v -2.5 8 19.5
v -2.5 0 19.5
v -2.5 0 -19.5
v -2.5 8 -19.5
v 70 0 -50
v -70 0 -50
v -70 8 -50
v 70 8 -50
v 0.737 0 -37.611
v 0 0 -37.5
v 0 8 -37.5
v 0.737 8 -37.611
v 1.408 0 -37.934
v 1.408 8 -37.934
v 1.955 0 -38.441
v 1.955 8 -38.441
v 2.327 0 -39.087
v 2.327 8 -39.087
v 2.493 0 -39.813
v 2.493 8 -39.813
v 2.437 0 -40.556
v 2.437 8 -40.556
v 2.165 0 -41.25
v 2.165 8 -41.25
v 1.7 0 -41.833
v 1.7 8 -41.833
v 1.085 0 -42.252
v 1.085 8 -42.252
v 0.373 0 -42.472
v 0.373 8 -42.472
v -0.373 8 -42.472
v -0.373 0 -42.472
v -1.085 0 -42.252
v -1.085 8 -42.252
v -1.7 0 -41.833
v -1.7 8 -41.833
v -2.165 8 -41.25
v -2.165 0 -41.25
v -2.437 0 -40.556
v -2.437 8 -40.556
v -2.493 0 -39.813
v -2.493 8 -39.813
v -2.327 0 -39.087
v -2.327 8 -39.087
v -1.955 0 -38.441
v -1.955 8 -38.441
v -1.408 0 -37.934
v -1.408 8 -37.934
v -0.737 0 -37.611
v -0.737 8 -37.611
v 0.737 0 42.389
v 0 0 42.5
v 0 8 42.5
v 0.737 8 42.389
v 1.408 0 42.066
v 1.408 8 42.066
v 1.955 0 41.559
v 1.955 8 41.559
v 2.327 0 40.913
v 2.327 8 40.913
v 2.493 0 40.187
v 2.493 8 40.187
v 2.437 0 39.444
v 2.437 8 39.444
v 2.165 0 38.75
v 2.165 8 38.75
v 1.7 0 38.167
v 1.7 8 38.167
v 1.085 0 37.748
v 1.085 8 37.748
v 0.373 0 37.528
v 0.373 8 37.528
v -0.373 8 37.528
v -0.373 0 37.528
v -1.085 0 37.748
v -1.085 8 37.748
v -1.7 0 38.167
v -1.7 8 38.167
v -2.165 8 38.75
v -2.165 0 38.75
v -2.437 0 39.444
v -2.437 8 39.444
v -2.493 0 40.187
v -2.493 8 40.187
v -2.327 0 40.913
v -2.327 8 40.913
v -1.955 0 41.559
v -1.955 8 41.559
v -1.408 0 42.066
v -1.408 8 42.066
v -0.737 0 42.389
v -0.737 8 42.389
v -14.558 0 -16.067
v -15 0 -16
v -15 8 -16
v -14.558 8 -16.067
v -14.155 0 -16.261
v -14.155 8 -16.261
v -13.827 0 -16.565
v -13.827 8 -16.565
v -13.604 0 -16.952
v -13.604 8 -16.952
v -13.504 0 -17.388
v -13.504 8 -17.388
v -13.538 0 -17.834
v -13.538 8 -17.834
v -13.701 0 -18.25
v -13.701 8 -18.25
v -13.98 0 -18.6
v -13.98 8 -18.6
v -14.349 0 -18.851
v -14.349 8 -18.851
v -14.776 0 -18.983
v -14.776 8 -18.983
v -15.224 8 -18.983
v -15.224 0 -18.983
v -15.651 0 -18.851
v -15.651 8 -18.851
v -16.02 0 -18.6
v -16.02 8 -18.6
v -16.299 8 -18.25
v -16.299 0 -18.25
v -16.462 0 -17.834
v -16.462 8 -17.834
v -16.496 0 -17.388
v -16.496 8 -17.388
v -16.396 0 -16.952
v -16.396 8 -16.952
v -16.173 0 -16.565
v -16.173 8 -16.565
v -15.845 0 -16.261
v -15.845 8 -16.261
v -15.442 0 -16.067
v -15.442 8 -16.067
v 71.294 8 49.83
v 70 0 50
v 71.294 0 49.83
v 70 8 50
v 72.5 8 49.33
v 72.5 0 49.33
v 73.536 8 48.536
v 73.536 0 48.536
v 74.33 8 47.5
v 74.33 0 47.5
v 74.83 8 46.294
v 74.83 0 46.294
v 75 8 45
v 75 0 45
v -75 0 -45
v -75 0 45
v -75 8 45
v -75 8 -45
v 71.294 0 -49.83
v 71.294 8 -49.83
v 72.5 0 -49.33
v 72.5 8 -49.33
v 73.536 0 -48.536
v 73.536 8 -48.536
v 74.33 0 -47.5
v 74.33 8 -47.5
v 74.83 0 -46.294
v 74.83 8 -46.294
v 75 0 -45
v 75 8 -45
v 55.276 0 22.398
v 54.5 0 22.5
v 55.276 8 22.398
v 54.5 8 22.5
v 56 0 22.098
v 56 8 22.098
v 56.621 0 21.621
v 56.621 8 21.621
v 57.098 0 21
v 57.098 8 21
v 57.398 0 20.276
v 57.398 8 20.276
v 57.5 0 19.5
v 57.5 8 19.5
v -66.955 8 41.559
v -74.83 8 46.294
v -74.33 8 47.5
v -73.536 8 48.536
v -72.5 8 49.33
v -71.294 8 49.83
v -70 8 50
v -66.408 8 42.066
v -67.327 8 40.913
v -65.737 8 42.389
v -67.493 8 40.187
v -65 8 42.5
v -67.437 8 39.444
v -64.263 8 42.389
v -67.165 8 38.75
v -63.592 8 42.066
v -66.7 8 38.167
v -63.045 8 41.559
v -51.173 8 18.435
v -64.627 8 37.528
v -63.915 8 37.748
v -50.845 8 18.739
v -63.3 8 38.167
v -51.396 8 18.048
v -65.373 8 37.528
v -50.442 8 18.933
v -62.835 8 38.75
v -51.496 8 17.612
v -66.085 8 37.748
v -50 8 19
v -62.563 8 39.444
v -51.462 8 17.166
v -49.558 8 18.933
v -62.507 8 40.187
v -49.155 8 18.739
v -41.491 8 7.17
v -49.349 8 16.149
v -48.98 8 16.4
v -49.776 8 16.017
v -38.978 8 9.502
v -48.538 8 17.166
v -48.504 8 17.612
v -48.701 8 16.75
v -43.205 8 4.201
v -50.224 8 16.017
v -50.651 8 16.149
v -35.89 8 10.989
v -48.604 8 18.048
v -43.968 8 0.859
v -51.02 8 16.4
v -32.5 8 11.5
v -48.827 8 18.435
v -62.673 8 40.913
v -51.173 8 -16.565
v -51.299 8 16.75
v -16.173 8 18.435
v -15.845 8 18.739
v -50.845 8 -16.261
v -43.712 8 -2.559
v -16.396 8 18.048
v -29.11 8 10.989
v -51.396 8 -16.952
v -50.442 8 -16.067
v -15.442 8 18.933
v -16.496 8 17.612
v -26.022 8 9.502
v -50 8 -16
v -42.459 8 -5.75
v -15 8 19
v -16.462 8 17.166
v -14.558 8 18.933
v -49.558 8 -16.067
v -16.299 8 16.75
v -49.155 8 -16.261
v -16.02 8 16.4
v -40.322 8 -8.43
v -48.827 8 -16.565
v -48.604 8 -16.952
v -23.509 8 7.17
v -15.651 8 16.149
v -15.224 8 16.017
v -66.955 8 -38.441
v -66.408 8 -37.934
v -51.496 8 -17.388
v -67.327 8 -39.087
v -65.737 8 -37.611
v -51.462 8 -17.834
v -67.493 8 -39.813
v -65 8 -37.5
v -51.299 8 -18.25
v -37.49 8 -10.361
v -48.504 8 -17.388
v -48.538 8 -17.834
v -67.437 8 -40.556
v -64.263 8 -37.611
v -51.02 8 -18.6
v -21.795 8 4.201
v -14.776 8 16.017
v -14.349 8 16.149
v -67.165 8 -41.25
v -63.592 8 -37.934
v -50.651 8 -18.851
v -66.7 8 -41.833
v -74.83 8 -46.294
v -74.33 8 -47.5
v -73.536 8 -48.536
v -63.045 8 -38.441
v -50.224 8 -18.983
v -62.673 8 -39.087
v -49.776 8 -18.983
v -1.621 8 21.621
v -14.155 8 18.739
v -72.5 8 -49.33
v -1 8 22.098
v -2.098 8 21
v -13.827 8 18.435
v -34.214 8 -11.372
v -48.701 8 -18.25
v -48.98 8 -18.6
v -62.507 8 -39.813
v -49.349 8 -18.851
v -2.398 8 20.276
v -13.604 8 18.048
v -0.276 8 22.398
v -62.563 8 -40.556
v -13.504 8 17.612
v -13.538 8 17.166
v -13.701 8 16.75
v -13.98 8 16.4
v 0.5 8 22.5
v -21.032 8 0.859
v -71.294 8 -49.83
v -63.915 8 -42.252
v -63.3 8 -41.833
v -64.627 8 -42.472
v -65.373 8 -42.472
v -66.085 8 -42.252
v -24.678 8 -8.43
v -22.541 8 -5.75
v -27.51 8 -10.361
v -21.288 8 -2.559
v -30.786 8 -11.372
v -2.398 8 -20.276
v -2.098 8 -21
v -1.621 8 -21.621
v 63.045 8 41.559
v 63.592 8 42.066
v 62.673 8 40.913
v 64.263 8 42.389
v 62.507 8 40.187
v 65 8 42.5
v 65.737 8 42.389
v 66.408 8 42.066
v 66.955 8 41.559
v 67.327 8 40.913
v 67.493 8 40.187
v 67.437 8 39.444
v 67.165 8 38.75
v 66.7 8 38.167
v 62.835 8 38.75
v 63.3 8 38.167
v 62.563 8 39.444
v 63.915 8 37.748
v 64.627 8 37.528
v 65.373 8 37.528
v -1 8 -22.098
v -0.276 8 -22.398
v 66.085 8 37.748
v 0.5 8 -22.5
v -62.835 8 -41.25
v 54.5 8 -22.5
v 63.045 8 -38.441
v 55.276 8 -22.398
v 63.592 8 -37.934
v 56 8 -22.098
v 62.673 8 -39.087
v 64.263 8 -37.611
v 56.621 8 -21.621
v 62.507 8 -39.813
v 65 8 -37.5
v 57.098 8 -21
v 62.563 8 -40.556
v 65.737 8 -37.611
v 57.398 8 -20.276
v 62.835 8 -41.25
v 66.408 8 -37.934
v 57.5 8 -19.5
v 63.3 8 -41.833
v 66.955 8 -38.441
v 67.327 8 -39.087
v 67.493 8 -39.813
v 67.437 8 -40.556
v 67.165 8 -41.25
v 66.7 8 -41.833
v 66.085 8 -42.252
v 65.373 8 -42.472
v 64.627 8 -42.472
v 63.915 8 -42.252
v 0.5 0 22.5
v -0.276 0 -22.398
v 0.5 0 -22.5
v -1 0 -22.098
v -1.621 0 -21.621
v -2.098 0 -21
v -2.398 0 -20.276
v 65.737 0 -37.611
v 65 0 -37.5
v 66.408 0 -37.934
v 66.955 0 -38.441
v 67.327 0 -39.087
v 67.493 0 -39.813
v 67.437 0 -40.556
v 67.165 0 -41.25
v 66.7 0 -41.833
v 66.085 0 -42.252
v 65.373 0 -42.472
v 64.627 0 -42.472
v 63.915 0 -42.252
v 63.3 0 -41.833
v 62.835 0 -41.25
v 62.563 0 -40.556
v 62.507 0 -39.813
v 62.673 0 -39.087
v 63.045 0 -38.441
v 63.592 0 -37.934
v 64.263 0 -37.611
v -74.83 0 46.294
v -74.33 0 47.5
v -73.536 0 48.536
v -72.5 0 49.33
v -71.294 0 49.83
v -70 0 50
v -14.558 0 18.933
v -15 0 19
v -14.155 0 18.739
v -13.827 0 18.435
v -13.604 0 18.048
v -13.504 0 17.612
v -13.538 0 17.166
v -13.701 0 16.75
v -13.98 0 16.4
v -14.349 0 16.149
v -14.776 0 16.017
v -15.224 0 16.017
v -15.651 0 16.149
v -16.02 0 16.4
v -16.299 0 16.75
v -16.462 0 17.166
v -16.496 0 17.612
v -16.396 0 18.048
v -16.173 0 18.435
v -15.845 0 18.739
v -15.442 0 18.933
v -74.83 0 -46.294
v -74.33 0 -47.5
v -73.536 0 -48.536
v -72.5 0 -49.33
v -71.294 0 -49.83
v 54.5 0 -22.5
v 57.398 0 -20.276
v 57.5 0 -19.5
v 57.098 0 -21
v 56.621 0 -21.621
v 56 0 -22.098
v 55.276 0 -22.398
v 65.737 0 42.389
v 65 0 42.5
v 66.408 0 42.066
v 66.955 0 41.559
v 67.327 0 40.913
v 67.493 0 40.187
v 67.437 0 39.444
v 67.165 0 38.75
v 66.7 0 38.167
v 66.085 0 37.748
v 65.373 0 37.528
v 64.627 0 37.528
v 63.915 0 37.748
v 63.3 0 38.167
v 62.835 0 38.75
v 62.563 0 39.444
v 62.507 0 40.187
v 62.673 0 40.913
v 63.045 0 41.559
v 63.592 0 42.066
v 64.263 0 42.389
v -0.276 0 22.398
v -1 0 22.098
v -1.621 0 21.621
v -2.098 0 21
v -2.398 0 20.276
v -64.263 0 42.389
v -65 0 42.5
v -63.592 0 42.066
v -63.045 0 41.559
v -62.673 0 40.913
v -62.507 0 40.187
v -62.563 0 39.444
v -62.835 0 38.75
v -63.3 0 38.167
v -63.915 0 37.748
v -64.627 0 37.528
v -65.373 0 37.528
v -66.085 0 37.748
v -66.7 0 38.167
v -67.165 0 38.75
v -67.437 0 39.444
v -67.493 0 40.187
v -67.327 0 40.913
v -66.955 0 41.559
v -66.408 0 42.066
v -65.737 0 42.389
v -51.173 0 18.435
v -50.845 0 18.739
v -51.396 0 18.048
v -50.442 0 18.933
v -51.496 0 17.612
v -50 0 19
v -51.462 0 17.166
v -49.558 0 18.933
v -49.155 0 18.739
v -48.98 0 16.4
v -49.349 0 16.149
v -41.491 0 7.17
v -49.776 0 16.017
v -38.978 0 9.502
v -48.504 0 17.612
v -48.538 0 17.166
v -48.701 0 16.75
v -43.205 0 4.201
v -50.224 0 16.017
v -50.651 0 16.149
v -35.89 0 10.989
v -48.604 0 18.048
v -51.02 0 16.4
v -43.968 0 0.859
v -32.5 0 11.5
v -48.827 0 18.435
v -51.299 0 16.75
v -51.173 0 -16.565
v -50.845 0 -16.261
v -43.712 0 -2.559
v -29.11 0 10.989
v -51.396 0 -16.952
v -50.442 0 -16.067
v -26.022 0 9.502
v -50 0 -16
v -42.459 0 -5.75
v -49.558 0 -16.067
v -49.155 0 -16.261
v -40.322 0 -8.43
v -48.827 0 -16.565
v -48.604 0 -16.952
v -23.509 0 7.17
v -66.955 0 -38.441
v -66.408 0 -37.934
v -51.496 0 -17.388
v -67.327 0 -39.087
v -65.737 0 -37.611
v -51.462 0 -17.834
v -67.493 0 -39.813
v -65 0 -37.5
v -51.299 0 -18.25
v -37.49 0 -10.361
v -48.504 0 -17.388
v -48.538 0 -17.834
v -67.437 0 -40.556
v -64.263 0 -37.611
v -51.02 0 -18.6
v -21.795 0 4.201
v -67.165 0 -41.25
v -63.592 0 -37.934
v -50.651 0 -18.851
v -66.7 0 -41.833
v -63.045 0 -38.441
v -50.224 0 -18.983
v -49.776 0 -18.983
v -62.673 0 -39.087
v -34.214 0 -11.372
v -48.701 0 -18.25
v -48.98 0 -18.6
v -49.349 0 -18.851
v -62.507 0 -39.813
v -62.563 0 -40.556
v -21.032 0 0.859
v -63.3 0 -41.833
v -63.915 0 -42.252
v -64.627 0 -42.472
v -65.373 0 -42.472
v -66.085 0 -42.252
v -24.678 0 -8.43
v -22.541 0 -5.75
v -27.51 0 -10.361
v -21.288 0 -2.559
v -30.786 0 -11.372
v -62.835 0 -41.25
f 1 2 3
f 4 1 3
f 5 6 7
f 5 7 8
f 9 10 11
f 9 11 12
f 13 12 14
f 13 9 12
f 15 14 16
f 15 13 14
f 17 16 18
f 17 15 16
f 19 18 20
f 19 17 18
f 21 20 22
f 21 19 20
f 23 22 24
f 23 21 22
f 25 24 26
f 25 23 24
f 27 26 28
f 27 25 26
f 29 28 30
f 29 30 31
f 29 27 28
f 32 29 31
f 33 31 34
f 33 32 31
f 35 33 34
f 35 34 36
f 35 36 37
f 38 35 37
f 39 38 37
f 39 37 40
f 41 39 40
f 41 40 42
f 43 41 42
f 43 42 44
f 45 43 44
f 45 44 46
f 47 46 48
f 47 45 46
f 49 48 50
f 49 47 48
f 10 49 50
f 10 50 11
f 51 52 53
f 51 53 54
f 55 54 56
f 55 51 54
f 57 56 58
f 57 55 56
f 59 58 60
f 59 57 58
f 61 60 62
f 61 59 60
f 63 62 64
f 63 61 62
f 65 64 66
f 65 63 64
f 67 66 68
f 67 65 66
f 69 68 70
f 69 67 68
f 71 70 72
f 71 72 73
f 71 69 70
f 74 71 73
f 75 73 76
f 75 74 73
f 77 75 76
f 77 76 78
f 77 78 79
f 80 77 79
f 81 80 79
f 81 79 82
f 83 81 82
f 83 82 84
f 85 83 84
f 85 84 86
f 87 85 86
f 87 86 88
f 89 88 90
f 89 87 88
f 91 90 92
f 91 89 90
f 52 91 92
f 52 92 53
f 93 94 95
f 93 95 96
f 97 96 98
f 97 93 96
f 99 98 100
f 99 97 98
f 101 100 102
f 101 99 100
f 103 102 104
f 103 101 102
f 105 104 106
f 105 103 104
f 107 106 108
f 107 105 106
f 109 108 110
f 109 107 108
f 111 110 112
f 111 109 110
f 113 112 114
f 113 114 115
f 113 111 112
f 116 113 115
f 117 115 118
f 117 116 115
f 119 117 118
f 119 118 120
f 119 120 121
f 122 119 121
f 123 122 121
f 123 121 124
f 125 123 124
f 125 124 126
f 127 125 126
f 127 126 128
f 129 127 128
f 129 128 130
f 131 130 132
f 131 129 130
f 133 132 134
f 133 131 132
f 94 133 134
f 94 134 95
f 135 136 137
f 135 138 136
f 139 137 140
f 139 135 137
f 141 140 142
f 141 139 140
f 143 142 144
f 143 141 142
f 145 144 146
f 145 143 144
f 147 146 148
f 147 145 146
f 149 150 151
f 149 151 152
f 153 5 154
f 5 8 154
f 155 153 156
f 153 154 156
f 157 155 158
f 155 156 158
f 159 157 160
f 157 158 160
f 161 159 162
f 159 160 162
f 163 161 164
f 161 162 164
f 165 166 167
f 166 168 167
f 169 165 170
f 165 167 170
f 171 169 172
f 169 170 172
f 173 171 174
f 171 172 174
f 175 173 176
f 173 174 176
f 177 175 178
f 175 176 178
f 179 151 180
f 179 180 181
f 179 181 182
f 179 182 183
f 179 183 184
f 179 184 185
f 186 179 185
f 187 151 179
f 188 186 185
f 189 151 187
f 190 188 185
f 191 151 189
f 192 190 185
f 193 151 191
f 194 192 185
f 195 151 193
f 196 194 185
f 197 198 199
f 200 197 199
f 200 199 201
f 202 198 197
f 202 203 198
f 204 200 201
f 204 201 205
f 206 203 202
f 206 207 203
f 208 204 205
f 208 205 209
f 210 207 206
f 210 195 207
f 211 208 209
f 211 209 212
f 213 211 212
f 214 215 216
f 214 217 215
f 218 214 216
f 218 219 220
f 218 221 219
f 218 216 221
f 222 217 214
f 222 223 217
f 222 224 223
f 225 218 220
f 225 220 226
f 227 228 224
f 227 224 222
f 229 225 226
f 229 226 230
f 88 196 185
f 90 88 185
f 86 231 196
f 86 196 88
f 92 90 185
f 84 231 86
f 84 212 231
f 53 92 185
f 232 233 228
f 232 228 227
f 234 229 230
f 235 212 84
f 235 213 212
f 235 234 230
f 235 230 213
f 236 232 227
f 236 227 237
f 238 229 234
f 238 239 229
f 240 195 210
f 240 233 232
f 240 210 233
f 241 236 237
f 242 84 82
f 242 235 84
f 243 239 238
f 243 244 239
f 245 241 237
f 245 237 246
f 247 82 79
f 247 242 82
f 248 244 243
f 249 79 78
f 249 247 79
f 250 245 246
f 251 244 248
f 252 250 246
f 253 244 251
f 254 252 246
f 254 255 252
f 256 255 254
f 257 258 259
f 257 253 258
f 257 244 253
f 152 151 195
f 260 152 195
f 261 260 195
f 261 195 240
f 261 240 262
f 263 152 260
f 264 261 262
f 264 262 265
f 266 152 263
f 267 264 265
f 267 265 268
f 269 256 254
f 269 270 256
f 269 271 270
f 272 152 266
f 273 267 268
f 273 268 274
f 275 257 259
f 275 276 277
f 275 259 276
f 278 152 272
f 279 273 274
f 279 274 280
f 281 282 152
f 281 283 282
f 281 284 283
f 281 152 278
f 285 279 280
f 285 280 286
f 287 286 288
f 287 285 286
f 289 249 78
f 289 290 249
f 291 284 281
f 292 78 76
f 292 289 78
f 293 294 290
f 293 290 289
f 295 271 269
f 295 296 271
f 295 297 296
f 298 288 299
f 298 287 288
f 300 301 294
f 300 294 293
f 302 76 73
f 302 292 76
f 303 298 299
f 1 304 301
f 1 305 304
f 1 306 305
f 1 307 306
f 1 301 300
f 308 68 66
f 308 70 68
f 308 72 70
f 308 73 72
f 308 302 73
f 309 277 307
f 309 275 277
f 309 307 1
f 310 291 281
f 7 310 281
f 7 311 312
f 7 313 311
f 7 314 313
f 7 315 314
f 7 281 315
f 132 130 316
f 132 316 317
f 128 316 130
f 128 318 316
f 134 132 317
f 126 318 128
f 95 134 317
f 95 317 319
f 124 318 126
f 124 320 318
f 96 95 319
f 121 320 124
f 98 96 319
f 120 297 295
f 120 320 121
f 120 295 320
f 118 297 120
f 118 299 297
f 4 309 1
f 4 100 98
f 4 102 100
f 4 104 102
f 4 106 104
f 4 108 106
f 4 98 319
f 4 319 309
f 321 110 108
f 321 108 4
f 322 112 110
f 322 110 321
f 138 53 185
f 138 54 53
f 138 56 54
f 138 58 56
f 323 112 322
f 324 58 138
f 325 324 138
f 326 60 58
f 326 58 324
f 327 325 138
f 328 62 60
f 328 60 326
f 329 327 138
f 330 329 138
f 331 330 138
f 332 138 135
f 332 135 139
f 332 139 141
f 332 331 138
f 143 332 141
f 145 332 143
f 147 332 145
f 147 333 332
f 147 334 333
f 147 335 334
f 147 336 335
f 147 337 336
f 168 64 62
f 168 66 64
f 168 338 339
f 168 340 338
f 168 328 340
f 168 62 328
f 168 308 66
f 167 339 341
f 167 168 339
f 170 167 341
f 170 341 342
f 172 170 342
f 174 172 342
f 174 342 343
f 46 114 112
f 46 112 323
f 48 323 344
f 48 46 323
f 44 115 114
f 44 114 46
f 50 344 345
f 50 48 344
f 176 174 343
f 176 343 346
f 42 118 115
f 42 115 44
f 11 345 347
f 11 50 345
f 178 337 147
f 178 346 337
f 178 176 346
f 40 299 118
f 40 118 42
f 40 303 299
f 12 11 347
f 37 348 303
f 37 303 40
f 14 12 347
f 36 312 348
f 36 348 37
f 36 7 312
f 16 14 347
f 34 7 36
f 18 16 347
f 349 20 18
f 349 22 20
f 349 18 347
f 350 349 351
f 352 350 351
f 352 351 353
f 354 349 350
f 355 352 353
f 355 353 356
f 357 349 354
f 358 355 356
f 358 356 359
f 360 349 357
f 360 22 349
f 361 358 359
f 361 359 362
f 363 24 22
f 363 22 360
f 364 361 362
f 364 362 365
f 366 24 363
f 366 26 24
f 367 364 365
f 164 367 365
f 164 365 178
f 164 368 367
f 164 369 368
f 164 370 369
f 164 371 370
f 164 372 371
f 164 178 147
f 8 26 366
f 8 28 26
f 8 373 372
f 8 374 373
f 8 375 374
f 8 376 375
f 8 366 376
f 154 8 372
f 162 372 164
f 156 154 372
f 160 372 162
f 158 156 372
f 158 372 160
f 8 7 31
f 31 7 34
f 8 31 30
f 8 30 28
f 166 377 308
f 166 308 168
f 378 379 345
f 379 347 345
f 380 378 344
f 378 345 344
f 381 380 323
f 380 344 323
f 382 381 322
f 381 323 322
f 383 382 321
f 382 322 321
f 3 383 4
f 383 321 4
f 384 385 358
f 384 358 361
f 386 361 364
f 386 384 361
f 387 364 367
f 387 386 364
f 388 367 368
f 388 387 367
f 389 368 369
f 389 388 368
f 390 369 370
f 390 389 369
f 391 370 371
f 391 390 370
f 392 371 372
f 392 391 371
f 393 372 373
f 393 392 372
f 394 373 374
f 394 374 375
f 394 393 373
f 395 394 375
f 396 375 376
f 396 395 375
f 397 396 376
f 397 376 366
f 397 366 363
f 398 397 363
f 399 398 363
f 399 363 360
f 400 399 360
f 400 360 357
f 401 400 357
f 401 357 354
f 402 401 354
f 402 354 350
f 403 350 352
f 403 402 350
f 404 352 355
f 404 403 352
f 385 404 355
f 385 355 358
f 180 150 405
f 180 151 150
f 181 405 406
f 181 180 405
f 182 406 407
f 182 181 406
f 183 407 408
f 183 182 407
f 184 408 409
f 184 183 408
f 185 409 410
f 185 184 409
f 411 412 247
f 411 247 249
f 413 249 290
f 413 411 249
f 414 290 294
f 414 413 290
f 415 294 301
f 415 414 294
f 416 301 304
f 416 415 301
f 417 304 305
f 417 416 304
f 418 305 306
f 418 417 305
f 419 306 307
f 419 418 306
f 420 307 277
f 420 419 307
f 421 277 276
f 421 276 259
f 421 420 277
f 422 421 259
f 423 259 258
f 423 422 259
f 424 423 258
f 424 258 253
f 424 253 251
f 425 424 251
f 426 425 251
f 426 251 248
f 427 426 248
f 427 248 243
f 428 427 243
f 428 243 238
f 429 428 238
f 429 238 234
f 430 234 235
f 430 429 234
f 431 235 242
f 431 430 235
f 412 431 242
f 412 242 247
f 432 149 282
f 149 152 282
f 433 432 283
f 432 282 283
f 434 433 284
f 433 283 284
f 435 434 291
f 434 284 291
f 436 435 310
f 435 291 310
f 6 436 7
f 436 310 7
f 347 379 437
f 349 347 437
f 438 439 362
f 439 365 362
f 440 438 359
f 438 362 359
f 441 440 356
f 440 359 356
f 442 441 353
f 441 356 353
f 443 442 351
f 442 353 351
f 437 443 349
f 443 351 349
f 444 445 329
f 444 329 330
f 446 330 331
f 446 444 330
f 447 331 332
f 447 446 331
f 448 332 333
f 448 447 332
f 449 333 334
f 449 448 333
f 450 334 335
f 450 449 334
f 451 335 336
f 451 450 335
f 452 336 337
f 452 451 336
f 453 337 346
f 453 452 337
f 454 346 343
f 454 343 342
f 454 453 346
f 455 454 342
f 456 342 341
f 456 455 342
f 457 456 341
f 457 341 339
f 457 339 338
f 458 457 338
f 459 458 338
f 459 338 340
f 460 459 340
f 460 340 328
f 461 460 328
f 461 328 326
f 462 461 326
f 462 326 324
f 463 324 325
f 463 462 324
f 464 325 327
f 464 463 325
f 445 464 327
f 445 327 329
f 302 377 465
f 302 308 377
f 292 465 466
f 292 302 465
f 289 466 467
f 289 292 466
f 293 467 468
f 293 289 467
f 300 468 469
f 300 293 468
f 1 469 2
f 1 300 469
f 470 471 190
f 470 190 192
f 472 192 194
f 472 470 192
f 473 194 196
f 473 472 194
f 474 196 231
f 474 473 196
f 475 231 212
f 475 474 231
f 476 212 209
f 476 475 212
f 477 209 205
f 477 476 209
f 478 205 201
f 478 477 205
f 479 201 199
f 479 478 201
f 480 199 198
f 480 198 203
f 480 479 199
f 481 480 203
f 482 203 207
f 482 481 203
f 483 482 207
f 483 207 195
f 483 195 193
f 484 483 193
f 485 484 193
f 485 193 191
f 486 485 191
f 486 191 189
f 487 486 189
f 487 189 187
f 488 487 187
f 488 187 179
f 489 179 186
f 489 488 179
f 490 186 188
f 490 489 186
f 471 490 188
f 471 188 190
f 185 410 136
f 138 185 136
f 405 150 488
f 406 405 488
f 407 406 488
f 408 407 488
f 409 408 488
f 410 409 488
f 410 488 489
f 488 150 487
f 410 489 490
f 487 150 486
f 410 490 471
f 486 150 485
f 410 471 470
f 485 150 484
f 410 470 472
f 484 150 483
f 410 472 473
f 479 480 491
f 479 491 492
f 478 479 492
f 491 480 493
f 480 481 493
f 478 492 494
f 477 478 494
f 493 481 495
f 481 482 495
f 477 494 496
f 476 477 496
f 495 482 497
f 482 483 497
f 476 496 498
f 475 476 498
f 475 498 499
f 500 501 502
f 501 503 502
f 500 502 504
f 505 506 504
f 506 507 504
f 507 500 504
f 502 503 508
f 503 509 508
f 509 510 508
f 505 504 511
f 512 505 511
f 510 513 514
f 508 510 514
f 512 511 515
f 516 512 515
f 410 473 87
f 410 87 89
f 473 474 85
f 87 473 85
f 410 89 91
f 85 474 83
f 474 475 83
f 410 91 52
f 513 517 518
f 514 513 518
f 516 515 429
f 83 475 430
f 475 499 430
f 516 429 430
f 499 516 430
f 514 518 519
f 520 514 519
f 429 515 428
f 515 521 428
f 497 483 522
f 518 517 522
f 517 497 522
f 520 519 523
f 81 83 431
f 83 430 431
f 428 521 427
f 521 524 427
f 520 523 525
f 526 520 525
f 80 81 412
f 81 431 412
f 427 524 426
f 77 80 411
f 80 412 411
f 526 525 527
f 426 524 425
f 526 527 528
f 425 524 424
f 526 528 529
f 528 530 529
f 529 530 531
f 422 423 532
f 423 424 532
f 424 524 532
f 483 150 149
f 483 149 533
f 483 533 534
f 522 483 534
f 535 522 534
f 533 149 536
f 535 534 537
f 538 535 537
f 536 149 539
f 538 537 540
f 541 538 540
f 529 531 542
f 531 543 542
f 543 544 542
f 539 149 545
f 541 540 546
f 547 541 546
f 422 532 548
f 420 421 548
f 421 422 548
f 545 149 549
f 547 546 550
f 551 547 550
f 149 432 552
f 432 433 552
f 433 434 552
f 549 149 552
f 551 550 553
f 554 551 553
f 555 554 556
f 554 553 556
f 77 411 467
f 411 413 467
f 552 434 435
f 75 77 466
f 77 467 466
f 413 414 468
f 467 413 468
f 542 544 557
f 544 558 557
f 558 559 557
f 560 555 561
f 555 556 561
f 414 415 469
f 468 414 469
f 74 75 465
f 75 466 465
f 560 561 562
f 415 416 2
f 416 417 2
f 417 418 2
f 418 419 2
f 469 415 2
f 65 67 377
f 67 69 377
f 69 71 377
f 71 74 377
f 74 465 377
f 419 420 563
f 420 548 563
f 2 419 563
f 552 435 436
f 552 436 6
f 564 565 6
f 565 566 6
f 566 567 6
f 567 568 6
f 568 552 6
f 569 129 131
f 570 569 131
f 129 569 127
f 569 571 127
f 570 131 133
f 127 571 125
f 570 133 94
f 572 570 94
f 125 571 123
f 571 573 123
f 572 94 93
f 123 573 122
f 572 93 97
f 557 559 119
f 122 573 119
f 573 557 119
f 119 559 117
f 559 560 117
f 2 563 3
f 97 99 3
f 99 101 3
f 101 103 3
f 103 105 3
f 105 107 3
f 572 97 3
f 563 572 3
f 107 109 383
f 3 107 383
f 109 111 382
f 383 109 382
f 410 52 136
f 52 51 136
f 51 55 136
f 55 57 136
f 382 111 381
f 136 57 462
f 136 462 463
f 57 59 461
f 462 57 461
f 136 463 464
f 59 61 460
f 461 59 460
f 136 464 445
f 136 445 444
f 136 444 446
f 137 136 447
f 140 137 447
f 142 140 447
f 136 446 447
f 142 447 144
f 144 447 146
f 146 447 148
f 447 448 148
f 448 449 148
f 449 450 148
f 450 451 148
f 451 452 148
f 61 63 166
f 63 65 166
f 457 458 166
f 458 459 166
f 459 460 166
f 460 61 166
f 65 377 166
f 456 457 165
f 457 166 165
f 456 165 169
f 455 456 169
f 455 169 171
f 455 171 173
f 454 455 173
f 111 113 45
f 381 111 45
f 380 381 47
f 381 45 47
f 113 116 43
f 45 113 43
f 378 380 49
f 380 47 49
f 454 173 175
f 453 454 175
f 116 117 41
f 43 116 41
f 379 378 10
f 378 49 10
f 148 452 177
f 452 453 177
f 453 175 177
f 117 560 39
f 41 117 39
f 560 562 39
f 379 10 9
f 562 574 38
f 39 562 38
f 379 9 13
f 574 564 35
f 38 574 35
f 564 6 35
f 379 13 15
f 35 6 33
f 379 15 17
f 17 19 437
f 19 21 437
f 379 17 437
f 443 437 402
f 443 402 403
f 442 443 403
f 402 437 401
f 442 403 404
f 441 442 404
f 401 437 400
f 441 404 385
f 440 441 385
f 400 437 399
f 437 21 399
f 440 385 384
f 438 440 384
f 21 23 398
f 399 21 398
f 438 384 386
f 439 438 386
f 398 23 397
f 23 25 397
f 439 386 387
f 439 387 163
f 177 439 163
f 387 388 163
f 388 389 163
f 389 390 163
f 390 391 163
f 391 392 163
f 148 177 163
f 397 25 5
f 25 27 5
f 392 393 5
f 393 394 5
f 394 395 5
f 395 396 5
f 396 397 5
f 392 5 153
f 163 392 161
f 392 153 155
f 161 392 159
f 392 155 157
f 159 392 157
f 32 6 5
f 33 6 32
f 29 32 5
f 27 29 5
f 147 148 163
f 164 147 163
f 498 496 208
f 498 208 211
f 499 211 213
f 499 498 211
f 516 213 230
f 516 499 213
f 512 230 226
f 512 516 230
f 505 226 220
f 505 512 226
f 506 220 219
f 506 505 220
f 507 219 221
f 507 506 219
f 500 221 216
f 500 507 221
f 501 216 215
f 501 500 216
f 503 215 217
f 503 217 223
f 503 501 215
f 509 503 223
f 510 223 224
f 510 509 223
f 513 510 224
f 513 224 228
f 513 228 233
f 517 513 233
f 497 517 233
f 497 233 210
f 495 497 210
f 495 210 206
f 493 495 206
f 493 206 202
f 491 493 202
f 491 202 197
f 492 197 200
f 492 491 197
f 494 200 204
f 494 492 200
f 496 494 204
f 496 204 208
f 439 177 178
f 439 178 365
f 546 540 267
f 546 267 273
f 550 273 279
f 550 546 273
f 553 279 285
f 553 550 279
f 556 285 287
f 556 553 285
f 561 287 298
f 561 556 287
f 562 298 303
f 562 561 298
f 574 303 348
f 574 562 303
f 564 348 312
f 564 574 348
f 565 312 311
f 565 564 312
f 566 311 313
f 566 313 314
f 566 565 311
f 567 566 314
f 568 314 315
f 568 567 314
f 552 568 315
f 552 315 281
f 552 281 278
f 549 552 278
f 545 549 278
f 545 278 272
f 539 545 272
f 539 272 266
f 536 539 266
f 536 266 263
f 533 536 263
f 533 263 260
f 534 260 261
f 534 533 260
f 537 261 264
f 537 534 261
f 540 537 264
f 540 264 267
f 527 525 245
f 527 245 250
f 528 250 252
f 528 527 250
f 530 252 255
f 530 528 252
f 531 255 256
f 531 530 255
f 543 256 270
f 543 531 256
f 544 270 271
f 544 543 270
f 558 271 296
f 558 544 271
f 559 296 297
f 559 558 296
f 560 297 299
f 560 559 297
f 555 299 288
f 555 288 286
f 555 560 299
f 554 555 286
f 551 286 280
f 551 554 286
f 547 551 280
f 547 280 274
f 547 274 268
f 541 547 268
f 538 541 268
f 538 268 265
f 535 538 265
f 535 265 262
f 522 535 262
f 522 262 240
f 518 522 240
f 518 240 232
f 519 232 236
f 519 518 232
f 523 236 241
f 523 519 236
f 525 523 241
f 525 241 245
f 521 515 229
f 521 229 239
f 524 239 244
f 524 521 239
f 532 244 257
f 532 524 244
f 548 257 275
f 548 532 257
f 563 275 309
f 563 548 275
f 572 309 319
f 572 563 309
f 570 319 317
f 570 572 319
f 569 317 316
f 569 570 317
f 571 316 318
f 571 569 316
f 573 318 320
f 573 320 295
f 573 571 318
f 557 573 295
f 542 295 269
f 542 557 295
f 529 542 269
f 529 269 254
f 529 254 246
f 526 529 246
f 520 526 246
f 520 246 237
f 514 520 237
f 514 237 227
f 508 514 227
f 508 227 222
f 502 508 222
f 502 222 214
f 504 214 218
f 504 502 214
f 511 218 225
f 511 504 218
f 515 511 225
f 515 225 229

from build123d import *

# Parameters (mm, degrees)
SKETCH1_W           = 150
SKETCH1_H           = 100
SKETCH1_R           = 2.5
SKETCH1_R_2         = 11.5
SKETCH1_R_3         = 1.5
SKETCH1_W_2         = 60
SKETCH1_H_2         = 45
BOSS_EXTRUDE1_DEPTH = 8
FILLET2_R           = 5
FILLET4_R           = 3


with BuildPart() as part:
    # Sketch1 → Boss-Extrude1 (new body)
    with BuildSketch(Plane(origin=(0, 0, 0), x_dir=(1, 0, 0), z_dir=(0, 1, 0))):
        Rectangle(SKETCH1_W, SKETCH1_H)
        with Locations(Location((-65, 40, 0), (0, 0, 270))):
            Circle(SKETCH1_R, mode=Mode.SUBTRACT)
        with Locations(Location((0, 40, 0), (0, 0, 270))):
            Circle(SKETCH1_R, mode=Mode.SUBTRACT)
        with Locations(Location((65, 40, 0), (0, 0, 270))):
            Circle(SKETCH1_R, mode=Mode.SUBTRACT)
        with Locations(Location((0, -40, 0), (0, 0, 270))):
            Circle(SKETCH1_R, mode=Mode.SUBTRACT)
        with Locations(Location((65, -40, 0), (0, 0, 270))):
            Circle(SKETCH1_R, mode=Mode.SUBTRACT)
        with Locations(Location((-65, -40, 0), (0, 0, 270))):
            Circle(SKETCH1_R, mode=Mode.SUBTRACT)
        with Locations(Location((-32.5, 0, 0), (0, 0, 270))):
            Circle(SKETCH1_R_2, mode=Mode.SUBTRACT)
        with Locations(Location((-50, 17.5, 0), (0, 0, 270))):
            Circle(SKETCH1_R_3, mode=Mode.SUBTRACT)
        with Locations(Location((-15, 17.5, 0), (0, 0, 270))):
            Circle(SKETCH1_R_3, mode=Mode.SUBTRACT)
        with Locations(Location((-15, -17.5, 0), (0, 0, 270))):
            Circle(SKETCH1_R_3, mode=Mode.SUBTRACT)
        with Locations(Location((-50, -17.5, 0), (0, 0, 270))):
            Circle(SKETCH1_R_3, mode=Mode.SUBTRACT)
        with Locations((27.5, 0)):
            Rectangle(SKETCH1_W_2, SKETCH1_H_2, mode=Mode.SUBTRACT)
    extrude(amount=BOSS_EXTRUDE1_DEPTH)

    # Fillet2
    fillet2_edges = [part.edges().sort_by_distance(p)[0] for p in [
        (-75, 4, 50),
        (-75, 4, -50),
        (75, 4, -50),
        (75, 4, 50),
    ]]
    fillet(fillet2_edges, radius=FILLET2_R)

    # Fillet4
    fillet4_edges = [part.edges().sort_by_distance(p)[0] for p in [
        (57.5, 4, 22.5),
        (57.5, 4, -22.5),
        (-2.5, 4, -22.5),
        (-2.5, 4, 22.5),
    ]]
    fillet(fillet4_edges, radius=FILLET4_R)


solid = part.part
